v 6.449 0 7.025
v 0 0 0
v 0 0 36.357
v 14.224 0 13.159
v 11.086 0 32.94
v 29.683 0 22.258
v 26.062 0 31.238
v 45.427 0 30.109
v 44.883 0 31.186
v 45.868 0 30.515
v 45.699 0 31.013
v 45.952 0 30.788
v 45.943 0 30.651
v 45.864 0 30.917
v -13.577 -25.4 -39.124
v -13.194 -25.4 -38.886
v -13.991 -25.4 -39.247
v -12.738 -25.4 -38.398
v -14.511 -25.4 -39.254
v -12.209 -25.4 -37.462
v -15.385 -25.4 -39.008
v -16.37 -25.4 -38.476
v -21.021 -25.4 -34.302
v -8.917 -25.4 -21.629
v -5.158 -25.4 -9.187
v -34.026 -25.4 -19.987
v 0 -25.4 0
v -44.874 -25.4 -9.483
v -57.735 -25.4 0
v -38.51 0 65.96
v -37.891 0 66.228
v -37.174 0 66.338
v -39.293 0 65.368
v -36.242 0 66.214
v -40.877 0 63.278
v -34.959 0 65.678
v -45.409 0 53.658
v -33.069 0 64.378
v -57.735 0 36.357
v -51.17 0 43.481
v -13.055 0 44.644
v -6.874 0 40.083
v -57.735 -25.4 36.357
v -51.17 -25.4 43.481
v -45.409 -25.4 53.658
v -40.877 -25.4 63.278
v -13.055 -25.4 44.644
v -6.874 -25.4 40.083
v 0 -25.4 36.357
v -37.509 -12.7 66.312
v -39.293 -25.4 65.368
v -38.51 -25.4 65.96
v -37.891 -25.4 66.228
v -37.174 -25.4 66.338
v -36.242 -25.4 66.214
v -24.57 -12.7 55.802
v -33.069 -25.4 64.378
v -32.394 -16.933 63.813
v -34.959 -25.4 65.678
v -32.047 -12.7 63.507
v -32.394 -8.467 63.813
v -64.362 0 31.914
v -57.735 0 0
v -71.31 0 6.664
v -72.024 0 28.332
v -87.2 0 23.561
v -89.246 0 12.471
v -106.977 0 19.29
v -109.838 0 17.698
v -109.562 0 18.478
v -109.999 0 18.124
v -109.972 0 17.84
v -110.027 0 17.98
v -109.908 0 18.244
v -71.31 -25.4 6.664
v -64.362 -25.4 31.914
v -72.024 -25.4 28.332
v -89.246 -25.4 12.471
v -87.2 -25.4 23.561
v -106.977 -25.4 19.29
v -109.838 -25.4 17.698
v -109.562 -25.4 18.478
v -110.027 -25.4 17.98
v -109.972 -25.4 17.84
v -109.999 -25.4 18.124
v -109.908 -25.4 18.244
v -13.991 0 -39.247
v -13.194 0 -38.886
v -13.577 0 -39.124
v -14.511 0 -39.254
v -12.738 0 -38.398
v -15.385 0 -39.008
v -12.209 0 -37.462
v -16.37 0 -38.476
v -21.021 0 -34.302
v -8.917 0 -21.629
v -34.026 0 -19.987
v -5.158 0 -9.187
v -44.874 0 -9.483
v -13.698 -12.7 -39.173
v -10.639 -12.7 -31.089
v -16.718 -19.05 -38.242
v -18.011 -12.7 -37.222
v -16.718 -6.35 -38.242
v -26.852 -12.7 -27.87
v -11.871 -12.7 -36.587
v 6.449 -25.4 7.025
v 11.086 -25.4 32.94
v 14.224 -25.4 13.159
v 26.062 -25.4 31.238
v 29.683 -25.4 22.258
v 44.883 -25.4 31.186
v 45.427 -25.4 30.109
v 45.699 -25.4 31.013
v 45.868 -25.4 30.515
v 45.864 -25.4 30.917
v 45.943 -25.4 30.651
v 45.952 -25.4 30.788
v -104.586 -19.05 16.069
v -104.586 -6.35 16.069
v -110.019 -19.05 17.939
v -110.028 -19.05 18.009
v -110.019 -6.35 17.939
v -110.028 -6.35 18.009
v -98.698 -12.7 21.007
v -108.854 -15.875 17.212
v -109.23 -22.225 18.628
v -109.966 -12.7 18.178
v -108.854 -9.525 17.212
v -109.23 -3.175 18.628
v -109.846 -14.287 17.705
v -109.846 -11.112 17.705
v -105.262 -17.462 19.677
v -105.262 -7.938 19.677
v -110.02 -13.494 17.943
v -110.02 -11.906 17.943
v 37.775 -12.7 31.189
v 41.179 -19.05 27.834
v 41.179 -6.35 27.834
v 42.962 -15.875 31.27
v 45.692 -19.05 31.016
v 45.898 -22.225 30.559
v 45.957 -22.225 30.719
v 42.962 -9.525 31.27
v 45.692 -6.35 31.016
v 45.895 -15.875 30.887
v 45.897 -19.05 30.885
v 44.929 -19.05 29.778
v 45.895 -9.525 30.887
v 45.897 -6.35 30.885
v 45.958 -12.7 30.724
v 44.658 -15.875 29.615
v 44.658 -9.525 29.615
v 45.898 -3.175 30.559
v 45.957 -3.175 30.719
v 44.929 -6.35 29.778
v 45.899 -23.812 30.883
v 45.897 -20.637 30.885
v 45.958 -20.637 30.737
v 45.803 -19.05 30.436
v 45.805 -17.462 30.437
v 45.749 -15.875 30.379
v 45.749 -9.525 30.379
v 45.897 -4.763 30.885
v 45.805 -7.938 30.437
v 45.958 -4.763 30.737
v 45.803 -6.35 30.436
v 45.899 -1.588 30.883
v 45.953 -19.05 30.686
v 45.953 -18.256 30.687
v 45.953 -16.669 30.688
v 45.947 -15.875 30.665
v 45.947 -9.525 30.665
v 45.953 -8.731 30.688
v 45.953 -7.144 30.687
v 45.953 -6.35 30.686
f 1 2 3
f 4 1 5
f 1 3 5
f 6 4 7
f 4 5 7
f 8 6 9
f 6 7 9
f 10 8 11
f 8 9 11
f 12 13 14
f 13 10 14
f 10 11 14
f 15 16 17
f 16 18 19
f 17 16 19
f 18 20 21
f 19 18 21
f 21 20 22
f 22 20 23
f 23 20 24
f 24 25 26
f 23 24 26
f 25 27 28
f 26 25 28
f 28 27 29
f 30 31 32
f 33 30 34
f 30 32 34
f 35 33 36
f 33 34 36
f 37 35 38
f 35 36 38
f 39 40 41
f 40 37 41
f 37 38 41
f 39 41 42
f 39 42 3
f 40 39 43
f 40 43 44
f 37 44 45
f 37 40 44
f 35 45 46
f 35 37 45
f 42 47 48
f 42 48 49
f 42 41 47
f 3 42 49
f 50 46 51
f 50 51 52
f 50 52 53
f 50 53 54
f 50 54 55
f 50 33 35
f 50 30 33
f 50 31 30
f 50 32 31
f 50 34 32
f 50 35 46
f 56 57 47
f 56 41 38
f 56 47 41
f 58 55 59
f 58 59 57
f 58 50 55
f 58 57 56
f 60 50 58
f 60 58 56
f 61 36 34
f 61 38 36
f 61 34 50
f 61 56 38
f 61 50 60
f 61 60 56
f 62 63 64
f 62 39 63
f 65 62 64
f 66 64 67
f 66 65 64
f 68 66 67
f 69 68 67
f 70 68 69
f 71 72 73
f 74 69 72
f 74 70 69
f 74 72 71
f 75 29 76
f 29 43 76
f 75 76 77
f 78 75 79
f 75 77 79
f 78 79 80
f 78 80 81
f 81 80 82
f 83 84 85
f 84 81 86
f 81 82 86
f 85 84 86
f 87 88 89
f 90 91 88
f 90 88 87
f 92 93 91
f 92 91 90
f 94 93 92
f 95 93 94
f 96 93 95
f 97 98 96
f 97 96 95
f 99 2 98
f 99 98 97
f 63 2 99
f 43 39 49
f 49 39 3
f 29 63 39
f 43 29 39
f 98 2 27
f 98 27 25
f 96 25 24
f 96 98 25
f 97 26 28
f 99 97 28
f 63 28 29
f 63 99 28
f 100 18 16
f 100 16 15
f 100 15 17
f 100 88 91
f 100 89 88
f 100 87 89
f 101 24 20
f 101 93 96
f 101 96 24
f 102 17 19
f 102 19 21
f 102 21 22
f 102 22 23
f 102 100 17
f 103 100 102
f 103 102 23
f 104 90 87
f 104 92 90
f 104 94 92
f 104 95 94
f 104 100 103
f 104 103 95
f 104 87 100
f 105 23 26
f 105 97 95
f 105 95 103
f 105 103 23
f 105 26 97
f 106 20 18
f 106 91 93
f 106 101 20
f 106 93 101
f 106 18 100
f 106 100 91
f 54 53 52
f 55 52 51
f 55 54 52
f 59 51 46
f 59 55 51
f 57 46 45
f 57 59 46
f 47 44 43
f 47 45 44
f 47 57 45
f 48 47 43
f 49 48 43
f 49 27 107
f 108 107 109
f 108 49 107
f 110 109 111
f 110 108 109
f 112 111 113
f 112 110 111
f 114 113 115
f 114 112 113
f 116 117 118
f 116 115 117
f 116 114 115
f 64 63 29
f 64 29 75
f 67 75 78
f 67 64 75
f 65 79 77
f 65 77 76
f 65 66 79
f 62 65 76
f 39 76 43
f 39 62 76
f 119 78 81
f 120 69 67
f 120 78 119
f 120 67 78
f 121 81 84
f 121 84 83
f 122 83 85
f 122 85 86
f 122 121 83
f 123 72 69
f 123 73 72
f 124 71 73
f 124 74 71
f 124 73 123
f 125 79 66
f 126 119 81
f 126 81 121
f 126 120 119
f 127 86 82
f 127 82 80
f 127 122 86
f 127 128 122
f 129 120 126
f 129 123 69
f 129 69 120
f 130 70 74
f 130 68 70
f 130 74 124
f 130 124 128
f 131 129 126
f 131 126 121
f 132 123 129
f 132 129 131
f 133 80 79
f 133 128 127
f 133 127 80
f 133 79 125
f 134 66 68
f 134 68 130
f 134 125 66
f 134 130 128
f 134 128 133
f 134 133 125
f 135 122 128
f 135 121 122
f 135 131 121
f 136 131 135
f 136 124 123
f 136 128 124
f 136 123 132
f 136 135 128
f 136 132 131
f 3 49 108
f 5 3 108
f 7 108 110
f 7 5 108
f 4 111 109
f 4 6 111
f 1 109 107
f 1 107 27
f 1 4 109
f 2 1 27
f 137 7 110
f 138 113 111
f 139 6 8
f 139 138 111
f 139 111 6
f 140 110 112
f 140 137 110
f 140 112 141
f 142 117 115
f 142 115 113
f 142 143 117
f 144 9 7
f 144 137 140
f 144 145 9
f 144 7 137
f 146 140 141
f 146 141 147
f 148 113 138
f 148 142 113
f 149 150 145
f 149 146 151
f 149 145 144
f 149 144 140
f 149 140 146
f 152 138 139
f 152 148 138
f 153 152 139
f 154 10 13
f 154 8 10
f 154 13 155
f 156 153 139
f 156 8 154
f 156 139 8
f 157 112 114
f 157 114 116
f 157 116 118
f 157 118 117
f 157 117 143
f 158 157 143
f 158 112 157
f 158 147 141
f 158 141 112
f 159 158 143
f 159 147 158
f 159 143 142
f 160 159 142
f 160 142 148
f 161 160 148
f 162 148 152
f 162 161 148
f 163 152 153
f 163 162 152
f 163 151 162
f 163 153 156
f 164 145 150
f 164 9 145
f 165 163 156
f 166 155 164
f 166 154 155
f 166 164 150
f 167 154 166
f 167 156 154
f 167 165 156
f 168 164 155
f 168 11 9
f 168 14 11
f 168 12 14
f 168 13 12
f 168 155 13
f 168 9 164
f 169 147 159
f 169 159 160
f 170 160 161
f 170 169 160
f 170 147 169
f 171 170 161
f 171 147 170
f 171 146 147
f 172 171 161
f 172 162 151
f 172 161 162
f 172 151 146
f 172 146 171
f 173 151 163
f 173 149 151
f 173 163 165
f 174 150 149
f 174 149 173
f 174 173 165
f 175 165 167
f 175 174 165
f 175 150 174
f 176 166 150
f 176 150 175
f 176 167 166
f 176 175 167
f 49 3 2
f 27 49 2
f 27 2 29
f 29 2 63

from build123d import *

# Parameters (mm, degrees)
F1_DEPTH = 25.4


with BuildPart() as f1:
    # F0 (on Front) → F1 (new body)
    with BuildSketch(Plane.XZ):
        with BuildLine():
            add(Edge.make_bspline(
                [(0, 0), (-11.6956861938, -15.8081054352), (-6.3394963159, -63.5392271208), (-34.0793971735, -14.2799942658), (-57.7352158725, 0)],
                knots=[0.483869017, 0.483869017, 0.483869017, 0.483869017, 0.5985504595, 0.735221842, 0.735221842, 0.735221842, 0.735221842], degree=3))
            Line((0, 0), (-57.7352158725, 0))
        make_face()
    extrude(amount=F1_DEPTH)


with BuildPart() as f1b:
    # F0 (on Front) → F1, piece 2 (new body)
    with BuildSketch(Plane.XZ):
        with BuildLine():
            add(Edge.make_bspline(
                [(-57.7352158725, 0), (-80.6498304168, 13.8325613862), (-142.5663699976, 18.0315682787), (-74.0803961255, 22.8173940259), (-57.7352158725, 36.3565459847)],
                knots=[0.735221842, 0.735221842, 0.735221842, 0.735221842, 0.867610921, 1, 1, 1, 1], degree=3))
            Line((-57.7352158725, 0), (-57.7352158725, 36.3565459847))
        make_face()
    extrude(amount=F1_DEPTH)


with BuildPart() as f1c:
    # F0 (on Front) → F1, piece 3 (new body)
    with BuildSketch(Plane.XZ):
        with BuildLine():
            Line((-57.7352158725, 36.3565459847), (0, 36.3565459847))
            add(Edge.make_bspline(
                [(-57.7352158725, 36.3565459847), (-44.521123339, 47.3021338608), (-41.256905931, 86.5416845028), (-19.5567828877, 44.9336076077), (0, 36.3565459847)],
                knots=[0, 0, 0, 0, 0.1070285866, 0.230369785, 0.230369785, 0.230369785, 0.230369785], degree=3))
        make_face()
    extrude(amount=F1_DEPTH)


with BuildPart() as f1d:
    # F0 (on Front) → F1, piece 4 (new body)
    with BuildSketch(Plane.XZ):
        with BuildLine():
            Line((0, 36.3565459847), (0, 0))
            add(Edge.make_bspline(
                [(0, 36.3565459847), (19.207165717, 27.9328167393), (75.4255104082, 37.9587088662), (13.4989250969, 18.2453964356), (0, 0)],
                knots=[0.230369785, 0.230369785, 0.230369785, 0.230369785, 0.3515060092, 0.483869017, 0.483869017, 0.483869017, 0.483869017], degree=3))
        make_face()
    extrude(amount=F1_DEPTH)


solid = Compound([f1.part, f1b.part, f1c.part, f1d.part])
